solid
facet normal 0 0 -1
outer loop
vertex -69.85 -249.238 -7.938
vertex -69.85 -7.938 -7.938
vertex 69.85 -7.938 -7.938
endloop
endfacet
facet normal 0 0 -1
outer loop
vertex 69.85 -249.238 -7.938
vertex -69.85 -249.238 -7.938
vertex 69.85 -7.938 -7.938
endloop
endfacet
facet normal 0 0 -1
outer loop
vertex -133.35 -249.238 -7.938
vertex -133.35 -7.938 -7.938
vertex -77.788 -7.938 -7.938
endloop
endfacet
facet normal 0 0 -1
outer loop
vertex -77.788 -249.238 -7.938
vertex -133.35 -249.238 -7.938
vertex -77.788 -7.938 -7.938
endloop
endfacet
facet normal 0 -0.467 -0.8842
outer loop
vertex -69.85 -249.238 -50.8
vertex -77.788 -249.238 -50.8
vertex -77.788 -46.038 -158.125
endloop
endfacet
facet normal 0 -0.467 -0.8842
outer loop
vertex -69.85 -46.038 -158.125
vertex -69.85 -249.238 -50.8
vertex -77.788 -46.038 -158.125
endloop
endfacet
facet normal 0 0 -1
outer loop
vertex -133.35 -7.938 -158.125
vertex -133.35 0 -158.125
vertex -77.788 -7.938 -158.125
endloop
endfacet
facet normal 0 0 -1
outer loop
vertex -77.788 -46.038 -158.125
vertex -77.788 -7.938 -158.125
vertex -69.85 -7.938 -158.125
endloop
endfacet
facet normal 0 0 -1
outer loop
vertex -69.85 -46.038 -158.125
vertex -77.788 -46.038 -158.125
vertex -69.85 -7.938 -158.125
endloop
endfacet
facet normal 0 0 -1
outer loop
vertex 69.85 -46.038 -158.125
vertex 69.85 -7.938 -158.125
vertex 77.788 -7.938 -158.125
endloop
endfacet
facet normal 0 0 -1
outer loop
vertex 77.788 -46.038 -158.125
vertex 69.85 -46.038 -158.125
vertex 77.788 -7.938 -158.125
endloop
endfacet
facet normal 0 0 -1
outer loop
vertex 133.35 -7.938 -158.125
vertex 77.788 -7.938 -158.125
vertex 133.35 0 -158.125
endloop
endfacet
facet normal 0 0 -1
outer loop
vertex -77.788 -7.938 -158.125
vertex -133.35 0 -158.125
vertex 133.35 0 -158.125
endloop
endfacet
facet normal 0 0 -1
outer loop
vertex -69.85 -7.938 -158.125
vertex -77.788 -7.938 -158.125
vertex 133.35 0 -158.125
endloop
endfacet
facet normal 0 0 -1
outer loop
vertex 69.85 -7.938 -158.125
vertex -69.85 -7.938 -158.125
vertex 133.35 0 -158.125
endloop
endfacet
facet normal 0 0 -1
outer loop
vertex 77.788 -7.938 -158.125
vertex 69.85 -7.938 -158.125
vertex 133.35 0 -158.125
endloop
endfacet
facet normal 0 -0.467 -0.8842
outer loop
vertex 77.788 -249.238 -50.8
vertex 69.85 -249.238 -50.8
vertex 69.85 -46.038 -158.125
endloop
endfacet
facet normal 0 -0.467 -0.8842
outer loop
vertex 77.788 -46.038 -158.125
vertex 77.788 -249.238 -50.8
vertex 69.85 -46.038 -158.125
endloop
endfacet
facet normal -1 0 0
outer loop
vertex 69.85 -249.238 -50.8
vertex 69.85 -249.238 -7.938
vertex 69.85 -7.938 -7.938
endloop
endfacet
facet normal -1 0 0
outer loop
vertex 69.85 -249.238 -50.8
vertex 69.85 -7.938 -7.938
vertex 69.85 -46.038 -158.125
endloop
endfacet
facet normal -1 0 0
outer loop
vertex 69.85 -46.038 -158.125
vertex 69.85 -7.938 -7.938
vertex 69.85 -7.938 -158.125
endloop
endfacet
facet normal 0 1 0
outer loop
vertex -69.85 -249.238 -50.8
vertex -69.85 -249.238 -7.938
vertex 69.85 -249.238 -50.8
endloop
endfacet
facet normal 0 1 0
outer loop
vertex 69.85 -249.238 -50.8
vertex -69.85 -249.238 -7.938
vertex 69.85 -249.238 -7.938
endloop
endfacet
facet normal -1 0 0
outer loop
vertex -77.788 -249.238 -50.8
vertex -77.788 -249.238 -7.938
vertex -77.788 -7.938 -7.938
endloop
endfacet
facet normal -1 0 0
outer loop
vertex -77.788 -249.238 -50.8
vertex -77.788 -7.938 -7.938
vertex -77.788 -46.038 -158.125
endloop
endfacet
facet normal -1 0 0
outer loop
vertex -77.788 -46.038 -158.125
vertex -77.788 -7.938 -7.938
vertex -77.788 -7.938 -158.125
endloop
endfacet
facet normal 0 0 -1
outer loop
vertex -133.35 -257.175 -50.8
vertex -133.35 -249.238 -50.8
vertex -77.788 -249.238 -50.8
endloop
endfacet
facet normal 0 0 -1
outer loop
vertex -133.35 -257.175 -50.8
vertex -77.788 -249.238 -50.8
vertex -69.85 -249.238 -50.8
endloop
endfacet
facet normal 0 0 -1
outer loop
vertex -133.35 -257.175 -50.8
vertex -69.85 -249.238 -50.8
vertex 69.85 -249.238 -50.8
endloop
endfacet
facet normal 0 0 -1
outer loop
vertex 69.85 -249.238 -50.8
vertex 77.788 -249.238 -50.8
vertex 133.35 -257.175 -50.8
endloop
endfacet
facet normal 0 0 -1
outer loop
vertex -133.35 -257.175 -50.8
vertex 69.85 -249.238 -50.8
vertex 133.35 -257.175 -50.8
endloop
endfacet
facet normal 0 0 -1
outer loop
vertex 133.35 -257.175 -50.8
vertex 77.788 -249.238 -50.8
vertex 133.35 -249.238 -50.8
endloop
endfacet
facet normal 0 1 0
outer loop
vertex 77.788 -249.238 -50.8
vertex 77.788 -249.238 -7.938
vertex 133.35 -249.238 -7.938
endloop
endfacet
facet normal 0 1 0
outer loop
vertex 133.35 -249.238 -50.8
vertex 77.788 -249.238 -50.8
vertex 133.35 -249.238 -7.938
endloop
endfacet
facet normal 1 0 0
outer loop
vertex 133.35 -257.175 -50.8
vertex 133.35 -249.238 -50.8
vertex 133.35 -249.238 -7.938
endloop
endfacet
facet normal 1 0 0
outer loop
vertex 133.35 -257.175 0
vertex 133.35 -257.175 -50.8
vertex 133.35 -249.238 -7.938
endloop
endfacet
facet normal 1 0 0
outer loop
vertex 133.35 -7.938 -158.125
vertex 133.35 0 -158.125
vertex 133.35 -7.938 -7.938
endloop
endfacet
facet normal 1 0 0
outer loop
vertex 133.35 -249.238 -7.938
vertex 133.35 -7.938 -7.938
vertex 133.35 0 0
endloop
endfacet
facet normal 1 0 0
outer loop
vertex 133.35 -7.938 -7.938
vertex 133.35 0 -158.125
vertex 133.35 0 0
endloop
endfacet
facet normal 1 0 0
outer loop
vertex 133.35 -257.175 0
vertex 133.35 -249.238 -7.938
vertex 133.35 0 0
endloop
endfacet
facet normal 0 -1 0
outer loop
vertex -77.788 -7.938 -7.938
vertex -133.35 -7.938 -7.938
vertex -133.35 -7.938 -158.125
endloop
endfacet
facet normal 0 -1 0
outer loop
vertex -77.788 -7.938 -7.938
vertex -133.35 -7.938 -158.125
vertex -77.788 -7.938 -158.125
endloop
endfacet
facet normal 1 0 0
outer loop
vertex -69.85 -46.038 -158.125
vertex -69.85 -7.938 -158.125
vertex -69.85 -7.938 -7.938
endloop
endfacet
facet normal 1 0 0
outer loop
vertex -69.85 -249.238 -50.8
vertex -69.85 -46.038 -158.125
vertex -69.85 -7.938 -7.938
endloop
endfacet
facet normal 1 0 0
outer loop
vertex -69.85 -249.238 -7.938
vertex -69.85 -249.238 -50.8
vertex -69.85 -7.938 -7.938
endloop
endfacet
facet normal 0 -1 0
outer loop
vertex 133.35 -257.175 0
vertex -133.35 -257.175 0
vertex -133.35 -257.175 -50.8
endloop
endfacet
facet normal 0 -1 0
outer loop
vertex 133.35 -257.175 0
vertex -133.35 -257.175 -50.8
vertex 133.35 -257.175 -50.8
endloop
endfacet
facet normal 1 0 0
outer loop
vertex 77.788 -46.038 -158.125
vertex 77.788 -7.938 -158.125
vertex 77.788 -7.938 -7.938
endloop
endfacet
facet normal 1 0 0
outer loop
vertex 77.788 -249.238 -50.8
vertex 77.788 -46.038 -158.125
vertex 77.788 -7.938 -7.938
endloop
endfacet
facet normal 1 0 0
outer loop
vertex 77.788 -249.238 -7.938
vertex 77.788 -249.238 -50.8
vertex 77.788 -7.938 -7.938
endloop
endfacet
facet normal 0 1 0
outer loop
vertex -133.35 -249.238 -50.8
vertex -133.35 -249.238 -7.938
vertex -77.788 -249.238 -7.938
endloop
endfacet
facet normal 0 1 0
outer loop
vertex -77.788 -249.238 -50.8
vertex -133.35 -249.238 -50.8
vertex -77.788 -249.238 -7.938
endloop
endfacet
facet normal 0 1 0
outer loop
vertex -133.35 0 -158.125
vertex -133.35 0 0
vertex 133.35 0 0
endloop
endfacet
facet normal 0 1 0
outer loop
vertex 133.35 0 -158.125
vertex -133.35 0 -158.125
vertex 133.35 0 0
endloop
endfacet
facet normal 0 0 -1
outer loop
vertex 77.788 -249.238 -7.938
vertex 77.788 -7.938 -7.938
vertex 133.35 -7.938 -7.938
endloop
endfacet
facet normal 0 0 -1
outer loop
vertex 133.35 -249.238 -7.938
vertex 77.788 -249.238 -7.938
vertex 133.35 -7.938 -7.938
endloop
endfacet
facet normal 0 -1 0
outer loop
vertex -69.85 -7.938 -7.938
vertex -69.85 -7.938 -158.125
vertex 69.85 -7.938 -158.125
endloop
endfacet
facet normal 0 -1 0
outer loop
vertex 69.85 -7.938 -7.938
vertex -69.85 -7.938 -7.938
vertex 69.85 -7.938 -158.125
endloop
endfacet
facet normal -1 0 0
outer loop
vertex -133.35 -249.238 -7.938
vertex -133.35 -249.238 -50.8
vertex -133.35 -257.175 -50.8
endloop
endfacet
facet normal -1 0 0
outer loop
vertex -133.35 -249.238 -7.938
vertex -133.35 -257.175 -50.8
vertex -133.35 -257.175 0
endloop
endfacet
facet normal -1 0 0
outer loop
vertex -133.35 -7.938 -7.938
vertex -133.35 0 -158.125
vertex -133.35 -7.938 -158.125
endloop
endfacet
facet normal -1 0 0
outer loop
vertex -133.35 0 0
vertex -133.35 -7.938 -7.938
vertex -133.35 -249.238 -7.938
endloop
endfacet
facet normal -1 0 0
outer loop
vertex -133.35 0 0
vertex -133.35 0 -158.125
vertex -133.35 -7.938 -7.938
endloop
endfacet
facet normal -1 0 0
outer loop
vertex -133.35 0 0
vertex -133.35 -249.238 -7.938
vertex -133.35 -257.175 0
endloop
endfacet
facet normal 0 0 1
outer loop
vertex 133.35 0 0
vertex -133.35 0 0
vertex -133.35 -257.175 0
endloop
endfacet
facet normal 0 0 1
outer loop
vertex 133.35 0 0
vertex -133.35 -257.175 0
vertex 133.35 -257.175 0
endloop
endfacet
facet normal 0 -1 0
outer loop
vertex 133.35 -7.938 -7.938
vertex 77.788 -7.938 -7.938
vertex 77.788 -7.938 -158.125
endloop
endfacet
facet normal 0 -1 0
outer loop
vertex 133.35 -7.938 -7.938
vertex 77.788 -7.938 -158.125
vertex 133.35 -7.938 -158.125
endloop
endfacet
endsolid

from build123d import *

# Parameters (mm, degrees)
F0_W     = 266.7
F0_H     = 158.12516
F1_DEPTH = 7.9375
F4_DEPTH = 241.3
F6_DEPTH = 211.1385
F8_W     = 266.7
F8_H     = 50.8
F9_DEPTH = 7.9375


with BuildPart() as f1:
    # F0 (on Front) → F1 (new body)
    with BuildSketch(Plane.XZ):
        with Locations((0, -79.06258)):
            Rectangle(F0_W, F0_H)
    extrude(amount=F1_DEPTH)

    # F3 (on face) → F4 (join)
    with BuildSketch(Plane.XZ.offset(7.9375)):
        Polygon((133.35, 0), (-133.35, 0), (-133.35, -7.9375), (-77.7875, -7.9375), (-77.7875, -158.12516), (-69.85, -158.12516), (-69.85, -7.9375), (69.85, -7.9375), (69.85, -158.12516), (77.7875, -158.12516), (77.7875, -7.9375), (133.35, -7.9375), align=None)
    extrude(amount=F4_DEPTH)

    # F5 (on face) → F6 (cut, through all)
    with BuildSketch(Plane(origin=(-77.7875, 0, 0), x_dir=(0, -1, 0), z_dir=(-1, 0, 0))):
        Polygon((249.2375, -50.8), (46.0375, -158.12516), (249.2375, -158.12516), align=None)
    extrude(amount=-F6_DEPTH, mode=Mode.SUBTRACT)

    # F8 (on face) → F9 (join)
    with BuildSketch(Plane.XZ.offset(249.2375)):
        with Locations((0, -25.4)):
            Rectangle(F8_W, F8_H)
    extrude(amount=F9_DEPTH)


solid = f1.part
